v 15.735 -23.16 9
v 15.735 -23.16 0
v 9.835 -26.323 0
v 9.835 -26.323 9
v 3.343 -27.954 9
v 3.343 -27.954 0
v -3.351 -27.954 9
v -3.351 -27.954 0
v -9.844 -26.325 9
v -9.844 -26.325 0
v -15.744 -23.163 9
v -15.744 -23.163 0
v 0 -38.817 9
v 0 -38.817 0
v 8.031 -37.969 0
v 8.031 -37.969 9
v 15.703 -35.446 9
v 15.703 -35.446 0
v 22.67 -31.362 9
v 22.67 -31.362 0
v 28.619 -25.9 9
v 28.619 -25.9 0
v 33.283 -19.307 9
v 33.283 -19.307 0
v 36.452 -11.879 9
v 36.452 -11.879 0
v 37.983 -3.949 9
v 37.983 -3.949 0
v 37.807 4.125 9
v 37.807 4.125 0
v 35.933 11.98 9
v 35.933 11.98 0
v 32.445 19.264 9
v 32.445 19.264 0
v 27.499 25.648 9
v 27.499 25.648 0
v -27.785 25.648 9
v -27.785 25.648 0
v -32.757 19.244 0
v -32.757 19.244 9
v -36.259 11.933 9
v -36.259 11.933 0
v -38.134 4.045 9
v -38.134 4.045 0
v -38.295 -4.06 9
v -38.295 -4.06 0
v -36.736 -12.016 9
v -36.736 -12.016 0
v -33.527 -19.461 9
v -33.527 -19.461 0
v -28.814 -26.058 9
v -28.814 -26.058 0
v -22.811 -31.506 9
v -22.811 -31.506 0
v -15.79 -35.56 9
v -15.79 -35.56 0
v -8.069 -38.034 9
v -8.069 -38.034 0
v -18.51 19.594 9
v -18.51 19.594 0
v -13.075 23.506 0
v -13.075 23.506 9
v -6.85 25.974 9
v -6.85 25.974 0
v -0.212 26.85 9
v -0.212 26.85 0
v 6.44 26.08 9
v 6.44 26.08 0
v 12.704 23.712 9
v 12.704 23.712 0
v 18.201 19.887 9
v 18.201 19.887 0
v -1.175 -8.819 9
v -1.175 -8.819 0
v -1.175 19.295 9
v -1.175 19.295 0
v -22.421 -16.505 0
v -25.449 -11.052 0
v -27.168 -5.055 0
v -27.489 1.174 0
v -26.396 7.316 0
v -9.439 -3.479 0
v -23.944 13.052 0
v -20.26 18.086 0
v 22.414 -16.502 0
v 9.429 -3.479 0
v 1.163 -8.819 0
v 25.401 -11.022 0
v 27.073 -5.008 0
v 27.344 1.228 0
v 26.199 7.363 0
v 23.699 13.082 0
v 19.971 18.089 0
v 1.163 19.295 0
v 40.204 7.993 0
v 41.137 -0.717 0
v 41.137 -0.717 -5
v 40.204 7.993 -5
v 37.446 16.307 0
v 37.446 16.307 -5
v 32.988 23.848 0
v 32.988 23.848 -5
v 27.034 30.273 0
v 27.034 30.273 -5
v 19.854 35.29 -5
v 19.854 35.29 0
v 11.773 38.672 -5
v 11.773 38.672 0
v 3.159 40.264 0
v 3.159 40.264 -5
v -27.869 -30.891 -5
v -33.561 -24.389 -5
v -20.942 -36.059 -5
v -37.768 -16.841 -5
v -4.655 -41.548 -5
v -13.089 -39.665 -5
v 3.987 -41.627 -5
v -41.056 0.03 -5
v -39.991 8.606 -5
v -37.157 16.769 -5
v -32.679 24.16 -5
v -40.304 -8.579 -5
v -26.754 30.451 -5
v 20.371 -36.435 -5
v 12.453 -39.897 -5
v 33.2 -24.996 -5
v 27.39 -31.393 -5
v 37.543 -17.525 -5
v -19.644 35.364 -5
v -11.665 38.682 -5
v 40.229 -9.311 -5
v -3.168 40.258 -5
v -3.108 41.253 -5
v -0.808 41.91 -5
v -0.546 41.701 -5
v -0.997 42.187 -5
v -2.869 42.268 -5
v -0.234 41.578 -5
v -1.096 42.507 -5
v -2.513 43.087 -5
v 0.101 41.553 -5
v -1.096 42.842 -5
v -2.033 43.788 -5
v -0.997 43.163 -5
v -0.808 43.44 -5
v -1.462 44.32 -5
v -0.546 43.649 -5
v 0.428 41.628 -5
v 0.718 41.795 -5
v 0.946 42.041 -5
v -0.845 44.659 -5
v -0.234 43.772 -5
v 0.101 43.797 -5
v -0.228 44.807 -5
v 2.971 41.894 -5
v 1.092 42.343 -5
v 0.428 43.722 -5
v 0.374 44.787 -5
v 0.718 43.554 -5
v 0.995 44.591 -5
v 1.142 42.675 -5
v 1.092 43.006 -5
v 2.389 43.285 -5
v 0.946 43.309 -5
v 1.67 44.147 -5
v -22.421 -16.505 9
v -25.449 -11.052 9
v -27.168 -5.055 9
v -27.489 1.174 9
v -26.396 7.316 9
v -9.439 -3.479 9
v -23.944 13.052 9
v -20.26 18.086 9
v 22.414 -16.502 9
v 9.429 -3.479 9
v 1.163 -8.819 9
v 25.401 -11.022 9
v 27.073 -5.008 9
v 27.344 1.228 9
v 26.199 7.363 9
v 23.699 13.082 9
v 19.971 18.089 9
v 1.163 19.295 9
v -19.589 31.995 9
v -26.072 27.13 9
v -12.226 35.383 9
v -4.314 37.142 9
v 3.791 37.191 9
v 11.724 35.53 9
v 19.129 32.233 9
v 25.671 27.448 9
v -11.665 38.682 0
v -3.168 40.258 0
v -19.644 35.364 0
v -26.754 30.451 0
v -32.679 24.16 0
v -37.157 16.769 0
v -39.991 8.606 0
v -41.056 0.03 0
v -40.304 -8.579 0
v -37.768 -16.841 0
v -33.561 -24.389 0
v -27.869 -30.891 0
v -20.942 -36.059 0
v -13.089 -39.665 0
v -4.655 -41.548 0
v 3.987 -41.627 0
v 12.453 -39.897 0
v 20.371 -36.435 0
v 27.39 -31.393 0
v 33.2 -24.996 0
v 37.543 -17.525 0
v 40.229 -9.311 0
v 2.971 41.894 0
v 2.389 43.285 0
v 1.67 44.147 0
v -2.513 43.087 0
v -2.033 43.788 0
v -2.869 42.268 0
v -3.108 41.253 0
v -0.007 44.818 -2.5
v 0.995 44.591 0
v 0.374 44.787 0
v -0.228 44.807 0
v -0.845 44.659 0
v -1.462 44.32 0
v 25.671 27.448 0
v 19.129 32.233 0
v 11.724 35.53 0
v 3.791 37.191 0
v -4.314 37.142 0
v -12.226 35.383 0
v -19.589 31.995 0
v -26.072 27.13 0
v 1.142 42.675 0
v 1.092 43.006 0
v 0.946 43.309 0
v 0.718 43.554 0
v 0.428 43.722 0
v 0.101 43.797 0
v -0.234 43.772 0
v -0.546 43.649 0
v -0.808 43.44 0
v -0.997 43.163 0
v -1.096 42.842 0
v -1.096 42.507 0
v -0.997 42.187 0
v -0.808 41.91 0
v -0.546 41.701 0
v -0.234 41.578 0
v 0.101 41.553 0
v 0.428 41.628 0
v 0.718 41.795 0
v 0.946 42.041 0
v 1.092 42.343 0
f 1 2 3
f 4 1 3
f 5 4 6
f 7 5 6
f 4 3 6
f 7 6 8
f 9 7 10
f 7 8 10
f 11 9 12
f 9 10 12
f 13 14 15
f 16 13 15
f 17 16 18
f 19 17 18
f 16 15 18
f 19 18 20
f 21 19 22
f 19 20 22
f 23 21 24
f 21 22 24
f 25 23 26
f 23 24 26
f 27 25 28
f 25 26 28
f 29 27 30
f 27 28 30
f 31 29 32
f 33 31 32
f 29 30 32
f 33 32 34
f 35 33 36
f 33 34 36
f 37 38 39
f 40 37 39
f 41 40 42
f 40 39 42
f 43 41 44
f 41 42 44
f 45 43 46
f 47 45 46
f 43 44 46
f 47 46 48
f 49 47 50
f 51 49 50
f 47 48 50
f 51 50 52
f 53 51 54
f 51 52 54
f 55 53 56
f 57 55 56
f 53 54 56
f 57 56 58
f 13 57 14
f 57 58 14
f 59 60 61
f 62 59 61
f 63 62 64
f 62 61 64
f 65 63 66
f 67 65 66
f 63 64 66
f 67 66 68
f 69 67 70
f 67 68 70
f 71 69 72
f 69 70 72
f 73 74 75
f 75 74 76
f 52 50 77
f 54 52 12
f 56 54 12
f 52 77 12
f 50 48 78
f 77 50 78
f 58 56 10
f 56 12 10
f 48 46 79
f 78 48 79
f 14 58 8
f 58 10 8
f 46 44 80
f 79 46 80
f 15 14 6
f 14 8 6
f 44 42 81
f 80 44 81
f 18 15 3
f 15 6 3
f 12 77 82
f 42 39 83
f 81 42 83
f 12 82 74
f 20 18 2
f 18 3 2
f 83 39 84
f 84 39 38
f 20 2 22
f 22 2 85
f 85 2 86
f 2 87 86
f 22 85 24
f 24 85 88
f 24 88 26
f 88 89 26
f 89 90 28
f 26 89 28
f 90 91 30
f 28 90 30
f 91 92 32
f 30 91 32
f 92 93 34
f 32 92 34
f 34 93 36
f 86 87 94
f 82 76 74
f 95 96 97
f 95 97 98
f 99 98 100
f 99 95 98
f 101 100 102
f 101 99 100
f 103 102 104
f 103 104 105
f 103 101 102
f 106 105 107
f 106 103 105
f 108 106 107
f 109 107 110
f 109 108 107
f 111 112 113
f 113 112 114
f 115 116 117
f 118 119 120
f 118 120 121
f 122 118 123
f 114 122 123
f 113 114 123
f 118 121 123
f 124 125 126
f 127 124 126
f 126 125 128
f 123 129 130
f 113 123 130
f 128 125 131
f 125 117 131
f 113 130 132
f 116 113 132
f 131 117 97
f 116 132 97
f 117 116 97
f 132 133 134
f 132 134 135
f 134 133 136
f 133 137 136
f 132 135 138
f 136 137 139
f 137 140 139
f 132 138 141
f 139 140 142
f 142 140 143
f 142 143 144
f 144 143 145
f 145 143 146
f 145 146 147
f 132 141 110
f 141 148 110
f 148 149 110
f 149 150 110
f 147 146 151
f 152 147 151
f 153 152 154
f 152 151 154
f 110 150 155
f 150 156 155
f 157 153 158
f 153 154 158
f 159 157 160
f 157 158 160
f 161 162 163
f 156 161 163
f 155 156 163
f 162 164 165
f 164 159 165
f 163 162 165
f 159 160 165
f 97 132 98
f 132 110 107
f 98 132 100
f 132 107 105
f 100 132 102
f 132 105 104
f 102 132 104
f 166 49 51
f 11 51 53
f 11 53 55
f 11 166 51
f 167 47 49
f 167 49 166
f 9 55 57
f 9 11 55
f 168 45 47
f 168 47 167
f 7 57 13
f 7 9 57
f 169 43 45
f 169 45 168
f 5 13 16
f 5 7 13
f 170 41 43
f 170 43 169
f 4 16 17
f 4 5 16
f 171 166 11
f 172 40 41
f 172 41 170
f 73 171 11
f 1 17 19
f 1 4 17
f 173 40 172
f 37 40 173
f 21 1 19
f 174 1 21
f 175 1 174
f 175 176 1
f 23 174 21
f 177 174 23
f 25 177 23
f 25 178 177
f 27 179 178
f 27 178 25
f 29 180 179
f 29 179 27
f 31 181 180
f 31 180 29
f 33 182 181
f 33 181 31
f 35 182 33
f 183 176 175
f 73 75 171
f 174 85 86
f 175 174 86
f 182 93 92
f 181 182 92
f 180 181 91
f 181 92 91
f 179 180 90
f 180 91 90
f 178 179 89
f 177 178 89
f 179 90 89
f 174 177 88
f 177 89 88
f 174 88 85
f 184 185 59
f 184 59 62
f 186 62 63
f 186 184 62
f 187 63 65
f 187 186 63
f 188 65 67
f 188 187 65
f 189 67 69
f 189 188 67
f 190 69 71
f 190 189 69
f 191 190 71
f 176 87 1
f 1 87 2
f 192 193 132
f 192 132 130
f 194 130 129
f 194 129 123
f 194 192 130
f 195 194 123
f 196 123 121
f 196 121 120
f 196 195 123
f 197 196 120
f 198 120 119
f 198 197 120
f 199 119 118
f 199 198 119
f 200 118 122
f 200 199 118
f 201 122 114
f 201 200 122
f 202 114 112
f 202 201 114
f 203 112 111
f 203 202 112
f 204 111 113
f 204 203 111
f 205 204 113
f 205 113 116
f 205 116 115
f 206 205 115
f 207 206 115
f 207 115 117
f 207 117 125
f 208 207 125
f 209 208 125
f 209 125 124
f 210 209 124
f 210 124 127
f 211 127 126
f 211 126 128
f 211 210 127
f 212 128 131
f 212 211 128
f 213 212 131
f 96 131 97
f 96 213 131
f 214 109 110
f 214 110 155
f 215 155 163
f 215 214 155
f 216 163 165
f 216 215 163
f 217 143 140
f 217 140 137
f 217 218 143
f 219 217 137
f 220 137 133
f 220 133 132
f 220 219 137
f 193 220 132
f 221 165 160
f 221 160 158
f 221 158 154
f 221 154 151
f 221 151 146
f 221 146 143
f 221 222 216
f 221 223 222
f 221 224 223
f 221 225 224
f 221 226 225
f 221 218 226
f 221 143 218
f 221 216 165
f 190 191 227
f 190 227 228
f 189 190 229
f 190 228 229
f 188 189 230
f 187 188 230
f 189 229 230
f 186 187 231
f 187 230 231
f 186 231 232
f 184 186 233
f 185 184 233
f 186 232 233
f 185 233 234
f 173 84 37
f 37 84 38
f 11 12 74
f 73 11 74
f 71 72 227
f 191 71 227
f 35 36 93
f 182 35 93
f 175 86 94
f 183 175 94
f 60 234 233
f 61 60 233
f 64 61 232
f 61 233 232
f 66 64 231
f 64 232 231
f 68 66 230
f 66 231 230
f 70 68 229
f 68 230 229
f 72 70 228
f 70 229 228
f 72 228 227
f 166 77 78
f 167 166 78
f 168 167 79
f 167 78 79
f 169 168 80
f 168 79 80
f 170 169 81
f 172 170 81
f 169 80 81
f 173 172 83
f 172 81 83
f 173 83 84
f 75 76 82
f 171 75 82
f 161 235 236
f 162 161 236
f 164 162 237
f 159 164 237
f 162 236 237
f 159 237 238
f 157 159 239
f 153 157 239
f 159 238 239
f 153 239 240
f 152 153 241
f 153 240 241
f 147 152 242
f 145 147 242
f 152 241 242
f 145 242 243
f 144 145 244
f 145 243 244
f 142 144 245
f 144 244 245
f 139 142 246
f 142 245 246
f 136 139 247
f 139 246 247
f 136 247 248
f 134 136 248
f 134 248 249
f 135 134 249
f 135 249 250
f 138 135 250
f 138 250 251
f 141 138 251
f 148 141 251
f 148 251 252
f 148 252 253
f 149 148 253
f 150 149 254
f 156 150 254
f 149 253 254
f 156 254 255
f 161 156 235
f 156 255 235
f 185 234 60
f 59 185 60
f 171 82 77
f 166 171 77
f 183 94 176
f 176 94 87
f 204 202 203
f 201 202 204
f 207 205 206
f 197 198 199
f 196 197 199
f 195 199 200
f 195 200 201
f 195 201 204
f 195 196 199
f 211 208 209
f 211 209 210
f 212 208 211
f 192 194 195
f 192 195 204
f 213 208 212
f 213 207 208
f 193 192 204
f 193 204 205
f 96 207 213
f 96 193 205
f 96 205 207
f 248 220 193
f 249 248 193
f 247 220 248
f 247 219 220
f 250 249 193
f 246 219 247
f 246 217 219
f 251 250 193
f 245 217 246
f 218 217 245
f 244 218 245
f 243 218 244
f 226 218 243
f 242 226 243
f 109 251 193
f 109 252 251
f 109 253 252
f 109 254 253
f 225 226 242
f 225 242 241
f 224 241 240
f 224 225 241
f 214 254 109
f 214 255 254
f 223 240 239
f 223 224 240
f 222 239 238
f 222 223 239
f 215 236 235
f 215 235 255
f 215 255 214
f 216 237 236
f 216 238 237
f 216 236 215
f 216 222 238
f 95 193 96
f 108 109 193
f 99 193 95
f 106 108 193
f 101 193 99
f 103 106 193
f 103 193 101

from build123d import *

# Parameters (mm, degrees)
F1_DEPTH = 9
F2_R     = 1.125
F3_DEPTH = 5


with BuildPart() as f1:
    # F0 (on Top) → F1 (new body)
    with BuildSketch(Plane.XY):
        with BuildLine():
            ThreePointArc((-27.7851572983, 25.6478241513), (-35.3300224623, -15.8244609789), (0, -38.8171758487))
            ThreePointArc((0, -38.8171758487), (35.0651386041, -15.6772961153), (27.4986219097, 25.6478270487))
            Line((27.4986219097, 25.6478270487), (19.9710316921, 18.0886201117))
            ThreePointArc((19.9710316921, 18.0886201117), (27.3438998715, 1.2276154513), (22.4135696041, -16.5021478523))
            Line((22.4135696041, -16.5021478523), (9.429158096, -3.4792004982))
            Line((9.429158096, -3.4792004982), (1.1633894868, 19.2951941875))
            Line((1.1633894868, 19.2951941875), (1.1633894868, -8.8191203378))
            Line((1.1633894868, -8.8191203378), (15.7350308146, -23.1601556565))
            ThreePointArc((15.7350308146, -23.1601556565), (-0.0039367496, -28.1601458159), (-15.7438228851, -23.1630480561))
            Line((-15.7438228851, -23.1630480561), (-1.1745452514, -8.8191203378))
            Line((-1.1745452514, -8.8191203378), (-1.1745452514, 19.2951941875))
            Line((-1.1745452514, 19.2951941875), (-9.439389619, -3.4792004982))
            Line((-9.439389619, -3.4792004982), (-22.4207109125, -16.5050480561))
            ThreePointArc((-22.4207109125, -16.5050480561), (-27.4892093495, 1.1744861794), (-20.2602444936, 18.0859519439))
            Line((-20.2602444936, 18.0859519439), (-27.7851572983, 25.6478241513))
        make_face()
    extrude(amount=F1_DEPTH)


with BuildPart() as f1b:
    # F0 (on Top) → F1, piece 2 (new body)
    with BuildSketch(Plane.XY):
        with BuildLine():
            Line((18.2007942971, 19.8873482903), (25.6706493045, 27.4483482903))
            ThreePointArc((25.6706493045, 27.4483482903), (-0.2626638955, 37.3820908069), (-26.0717600144, 27.129943157))
            Line((-26.0717600144, 27.129943157), (-18.5103627229, 19.5943929955))
            ThreePointArc((-18.5103627229, 19.5943929955), (-0.2115154455, 26.8500413147), (18.2007942971, 19.8873482903))
        make_face()
    extrude(amount=F1_DEPTH)


with BuildPart() as f3:
    # F2 (on Top) → F3 (new body)
    with BuildSketch(Plane.XY):
        with BuildLine():
            ThreePointArc((-3.1680287262, 40.2576545843), (-27.8686418755, -30.8912355971), (41.137237508, -0.7171825961))
            ThreePointArc((41.137237508, -0.7171825961), (30.1829046543, 27.2193347766), (3.1591944081, 40.2640845141))
            add(Edge.make_bspline(
                [(-0.0044802468, 35.9473205903), (3.0767209483, 35.9473205903), (3.1591944081, 40.2640845141)],
                knots=[0, 0, 0, 1.5440264712, 1.5440264712, 1.5440264712], degree=2, weights=[1, 0.7165077314, 1]))
            add(Edge.make_bspline(
                [(-3.1680287262, 40.2576545843), (-3.0812146223, 35.9473205903), (-0.0044802468, 35.9473205903)],
                knots=[4.7406090401, 4.7406090401, 4.7406090401, 6.2831853072, 6.2831853072, 6.2831853072], degree=2, weights=[1, 0.7170133591, 1]))
        make_face()
        with BuildLine():
            add(Edge.make_bspline(
                [(-0.0044802468, 35.9473205903), (3.0767209483, 35.9473205903), (3.1591944081, 40.2640845141)],
                knots=[0, 0, 0, 1.5440264712, 1.5440264712, 1.5440264712], degree=2, weights=[1, 0.7165077314, 1]))
            ThreePointArc((3.1591944081, 40.2640845141), (-0.0045410765, 40.3828076201), (-3.1680287262, 40.2576545843))
            add(Edge.make_bspline(
                [(-3.1680287262, 40.2576545843), (-3.0812146223, 35.9473205903), (-0.0044802468, 35.9473205903)],
                knots=[4.7406090401, 4.7406090401, 4.7406090401, 6.2831853072, 6.2831853072, 6.2831853072], degree=2, weights=[1, 0.7170133591, 1]))
        make_face()
        with BuildLine():
            ThreePointArc((-3.1680287262, 40.2576545843), (-0.0045410765, 40.3828076201), (3.1591944081, 40.2640845141))
            add(Edge.make_bspline(
                [(3.1591944081, 40.2640845141), (3.2462675101, 44.821599455), (-0.0067750558, 44.8182936074), (-3.2598176216, 44.8149877598), (-3.1680287262, 40.2576545843)],
                knots=[1.5440264712, 1.5440264712, 1.5440264712, 3.1423177556, 3.1423177556, 4.7406090401, 4.7406090401, 4.7406090401], degree=2, weights=[1, 0.6973193338, 1, 0.6973193338, 1]))
        make_face()
        with Locations((0.0167925687, 42.6747910513)):
            Circle(F2_R, mode=Mode.SUBTRACT)
    extrude(amount=-F3_DEPTH)


solid = Compound([f1.part, f1b.part, f3.part])
